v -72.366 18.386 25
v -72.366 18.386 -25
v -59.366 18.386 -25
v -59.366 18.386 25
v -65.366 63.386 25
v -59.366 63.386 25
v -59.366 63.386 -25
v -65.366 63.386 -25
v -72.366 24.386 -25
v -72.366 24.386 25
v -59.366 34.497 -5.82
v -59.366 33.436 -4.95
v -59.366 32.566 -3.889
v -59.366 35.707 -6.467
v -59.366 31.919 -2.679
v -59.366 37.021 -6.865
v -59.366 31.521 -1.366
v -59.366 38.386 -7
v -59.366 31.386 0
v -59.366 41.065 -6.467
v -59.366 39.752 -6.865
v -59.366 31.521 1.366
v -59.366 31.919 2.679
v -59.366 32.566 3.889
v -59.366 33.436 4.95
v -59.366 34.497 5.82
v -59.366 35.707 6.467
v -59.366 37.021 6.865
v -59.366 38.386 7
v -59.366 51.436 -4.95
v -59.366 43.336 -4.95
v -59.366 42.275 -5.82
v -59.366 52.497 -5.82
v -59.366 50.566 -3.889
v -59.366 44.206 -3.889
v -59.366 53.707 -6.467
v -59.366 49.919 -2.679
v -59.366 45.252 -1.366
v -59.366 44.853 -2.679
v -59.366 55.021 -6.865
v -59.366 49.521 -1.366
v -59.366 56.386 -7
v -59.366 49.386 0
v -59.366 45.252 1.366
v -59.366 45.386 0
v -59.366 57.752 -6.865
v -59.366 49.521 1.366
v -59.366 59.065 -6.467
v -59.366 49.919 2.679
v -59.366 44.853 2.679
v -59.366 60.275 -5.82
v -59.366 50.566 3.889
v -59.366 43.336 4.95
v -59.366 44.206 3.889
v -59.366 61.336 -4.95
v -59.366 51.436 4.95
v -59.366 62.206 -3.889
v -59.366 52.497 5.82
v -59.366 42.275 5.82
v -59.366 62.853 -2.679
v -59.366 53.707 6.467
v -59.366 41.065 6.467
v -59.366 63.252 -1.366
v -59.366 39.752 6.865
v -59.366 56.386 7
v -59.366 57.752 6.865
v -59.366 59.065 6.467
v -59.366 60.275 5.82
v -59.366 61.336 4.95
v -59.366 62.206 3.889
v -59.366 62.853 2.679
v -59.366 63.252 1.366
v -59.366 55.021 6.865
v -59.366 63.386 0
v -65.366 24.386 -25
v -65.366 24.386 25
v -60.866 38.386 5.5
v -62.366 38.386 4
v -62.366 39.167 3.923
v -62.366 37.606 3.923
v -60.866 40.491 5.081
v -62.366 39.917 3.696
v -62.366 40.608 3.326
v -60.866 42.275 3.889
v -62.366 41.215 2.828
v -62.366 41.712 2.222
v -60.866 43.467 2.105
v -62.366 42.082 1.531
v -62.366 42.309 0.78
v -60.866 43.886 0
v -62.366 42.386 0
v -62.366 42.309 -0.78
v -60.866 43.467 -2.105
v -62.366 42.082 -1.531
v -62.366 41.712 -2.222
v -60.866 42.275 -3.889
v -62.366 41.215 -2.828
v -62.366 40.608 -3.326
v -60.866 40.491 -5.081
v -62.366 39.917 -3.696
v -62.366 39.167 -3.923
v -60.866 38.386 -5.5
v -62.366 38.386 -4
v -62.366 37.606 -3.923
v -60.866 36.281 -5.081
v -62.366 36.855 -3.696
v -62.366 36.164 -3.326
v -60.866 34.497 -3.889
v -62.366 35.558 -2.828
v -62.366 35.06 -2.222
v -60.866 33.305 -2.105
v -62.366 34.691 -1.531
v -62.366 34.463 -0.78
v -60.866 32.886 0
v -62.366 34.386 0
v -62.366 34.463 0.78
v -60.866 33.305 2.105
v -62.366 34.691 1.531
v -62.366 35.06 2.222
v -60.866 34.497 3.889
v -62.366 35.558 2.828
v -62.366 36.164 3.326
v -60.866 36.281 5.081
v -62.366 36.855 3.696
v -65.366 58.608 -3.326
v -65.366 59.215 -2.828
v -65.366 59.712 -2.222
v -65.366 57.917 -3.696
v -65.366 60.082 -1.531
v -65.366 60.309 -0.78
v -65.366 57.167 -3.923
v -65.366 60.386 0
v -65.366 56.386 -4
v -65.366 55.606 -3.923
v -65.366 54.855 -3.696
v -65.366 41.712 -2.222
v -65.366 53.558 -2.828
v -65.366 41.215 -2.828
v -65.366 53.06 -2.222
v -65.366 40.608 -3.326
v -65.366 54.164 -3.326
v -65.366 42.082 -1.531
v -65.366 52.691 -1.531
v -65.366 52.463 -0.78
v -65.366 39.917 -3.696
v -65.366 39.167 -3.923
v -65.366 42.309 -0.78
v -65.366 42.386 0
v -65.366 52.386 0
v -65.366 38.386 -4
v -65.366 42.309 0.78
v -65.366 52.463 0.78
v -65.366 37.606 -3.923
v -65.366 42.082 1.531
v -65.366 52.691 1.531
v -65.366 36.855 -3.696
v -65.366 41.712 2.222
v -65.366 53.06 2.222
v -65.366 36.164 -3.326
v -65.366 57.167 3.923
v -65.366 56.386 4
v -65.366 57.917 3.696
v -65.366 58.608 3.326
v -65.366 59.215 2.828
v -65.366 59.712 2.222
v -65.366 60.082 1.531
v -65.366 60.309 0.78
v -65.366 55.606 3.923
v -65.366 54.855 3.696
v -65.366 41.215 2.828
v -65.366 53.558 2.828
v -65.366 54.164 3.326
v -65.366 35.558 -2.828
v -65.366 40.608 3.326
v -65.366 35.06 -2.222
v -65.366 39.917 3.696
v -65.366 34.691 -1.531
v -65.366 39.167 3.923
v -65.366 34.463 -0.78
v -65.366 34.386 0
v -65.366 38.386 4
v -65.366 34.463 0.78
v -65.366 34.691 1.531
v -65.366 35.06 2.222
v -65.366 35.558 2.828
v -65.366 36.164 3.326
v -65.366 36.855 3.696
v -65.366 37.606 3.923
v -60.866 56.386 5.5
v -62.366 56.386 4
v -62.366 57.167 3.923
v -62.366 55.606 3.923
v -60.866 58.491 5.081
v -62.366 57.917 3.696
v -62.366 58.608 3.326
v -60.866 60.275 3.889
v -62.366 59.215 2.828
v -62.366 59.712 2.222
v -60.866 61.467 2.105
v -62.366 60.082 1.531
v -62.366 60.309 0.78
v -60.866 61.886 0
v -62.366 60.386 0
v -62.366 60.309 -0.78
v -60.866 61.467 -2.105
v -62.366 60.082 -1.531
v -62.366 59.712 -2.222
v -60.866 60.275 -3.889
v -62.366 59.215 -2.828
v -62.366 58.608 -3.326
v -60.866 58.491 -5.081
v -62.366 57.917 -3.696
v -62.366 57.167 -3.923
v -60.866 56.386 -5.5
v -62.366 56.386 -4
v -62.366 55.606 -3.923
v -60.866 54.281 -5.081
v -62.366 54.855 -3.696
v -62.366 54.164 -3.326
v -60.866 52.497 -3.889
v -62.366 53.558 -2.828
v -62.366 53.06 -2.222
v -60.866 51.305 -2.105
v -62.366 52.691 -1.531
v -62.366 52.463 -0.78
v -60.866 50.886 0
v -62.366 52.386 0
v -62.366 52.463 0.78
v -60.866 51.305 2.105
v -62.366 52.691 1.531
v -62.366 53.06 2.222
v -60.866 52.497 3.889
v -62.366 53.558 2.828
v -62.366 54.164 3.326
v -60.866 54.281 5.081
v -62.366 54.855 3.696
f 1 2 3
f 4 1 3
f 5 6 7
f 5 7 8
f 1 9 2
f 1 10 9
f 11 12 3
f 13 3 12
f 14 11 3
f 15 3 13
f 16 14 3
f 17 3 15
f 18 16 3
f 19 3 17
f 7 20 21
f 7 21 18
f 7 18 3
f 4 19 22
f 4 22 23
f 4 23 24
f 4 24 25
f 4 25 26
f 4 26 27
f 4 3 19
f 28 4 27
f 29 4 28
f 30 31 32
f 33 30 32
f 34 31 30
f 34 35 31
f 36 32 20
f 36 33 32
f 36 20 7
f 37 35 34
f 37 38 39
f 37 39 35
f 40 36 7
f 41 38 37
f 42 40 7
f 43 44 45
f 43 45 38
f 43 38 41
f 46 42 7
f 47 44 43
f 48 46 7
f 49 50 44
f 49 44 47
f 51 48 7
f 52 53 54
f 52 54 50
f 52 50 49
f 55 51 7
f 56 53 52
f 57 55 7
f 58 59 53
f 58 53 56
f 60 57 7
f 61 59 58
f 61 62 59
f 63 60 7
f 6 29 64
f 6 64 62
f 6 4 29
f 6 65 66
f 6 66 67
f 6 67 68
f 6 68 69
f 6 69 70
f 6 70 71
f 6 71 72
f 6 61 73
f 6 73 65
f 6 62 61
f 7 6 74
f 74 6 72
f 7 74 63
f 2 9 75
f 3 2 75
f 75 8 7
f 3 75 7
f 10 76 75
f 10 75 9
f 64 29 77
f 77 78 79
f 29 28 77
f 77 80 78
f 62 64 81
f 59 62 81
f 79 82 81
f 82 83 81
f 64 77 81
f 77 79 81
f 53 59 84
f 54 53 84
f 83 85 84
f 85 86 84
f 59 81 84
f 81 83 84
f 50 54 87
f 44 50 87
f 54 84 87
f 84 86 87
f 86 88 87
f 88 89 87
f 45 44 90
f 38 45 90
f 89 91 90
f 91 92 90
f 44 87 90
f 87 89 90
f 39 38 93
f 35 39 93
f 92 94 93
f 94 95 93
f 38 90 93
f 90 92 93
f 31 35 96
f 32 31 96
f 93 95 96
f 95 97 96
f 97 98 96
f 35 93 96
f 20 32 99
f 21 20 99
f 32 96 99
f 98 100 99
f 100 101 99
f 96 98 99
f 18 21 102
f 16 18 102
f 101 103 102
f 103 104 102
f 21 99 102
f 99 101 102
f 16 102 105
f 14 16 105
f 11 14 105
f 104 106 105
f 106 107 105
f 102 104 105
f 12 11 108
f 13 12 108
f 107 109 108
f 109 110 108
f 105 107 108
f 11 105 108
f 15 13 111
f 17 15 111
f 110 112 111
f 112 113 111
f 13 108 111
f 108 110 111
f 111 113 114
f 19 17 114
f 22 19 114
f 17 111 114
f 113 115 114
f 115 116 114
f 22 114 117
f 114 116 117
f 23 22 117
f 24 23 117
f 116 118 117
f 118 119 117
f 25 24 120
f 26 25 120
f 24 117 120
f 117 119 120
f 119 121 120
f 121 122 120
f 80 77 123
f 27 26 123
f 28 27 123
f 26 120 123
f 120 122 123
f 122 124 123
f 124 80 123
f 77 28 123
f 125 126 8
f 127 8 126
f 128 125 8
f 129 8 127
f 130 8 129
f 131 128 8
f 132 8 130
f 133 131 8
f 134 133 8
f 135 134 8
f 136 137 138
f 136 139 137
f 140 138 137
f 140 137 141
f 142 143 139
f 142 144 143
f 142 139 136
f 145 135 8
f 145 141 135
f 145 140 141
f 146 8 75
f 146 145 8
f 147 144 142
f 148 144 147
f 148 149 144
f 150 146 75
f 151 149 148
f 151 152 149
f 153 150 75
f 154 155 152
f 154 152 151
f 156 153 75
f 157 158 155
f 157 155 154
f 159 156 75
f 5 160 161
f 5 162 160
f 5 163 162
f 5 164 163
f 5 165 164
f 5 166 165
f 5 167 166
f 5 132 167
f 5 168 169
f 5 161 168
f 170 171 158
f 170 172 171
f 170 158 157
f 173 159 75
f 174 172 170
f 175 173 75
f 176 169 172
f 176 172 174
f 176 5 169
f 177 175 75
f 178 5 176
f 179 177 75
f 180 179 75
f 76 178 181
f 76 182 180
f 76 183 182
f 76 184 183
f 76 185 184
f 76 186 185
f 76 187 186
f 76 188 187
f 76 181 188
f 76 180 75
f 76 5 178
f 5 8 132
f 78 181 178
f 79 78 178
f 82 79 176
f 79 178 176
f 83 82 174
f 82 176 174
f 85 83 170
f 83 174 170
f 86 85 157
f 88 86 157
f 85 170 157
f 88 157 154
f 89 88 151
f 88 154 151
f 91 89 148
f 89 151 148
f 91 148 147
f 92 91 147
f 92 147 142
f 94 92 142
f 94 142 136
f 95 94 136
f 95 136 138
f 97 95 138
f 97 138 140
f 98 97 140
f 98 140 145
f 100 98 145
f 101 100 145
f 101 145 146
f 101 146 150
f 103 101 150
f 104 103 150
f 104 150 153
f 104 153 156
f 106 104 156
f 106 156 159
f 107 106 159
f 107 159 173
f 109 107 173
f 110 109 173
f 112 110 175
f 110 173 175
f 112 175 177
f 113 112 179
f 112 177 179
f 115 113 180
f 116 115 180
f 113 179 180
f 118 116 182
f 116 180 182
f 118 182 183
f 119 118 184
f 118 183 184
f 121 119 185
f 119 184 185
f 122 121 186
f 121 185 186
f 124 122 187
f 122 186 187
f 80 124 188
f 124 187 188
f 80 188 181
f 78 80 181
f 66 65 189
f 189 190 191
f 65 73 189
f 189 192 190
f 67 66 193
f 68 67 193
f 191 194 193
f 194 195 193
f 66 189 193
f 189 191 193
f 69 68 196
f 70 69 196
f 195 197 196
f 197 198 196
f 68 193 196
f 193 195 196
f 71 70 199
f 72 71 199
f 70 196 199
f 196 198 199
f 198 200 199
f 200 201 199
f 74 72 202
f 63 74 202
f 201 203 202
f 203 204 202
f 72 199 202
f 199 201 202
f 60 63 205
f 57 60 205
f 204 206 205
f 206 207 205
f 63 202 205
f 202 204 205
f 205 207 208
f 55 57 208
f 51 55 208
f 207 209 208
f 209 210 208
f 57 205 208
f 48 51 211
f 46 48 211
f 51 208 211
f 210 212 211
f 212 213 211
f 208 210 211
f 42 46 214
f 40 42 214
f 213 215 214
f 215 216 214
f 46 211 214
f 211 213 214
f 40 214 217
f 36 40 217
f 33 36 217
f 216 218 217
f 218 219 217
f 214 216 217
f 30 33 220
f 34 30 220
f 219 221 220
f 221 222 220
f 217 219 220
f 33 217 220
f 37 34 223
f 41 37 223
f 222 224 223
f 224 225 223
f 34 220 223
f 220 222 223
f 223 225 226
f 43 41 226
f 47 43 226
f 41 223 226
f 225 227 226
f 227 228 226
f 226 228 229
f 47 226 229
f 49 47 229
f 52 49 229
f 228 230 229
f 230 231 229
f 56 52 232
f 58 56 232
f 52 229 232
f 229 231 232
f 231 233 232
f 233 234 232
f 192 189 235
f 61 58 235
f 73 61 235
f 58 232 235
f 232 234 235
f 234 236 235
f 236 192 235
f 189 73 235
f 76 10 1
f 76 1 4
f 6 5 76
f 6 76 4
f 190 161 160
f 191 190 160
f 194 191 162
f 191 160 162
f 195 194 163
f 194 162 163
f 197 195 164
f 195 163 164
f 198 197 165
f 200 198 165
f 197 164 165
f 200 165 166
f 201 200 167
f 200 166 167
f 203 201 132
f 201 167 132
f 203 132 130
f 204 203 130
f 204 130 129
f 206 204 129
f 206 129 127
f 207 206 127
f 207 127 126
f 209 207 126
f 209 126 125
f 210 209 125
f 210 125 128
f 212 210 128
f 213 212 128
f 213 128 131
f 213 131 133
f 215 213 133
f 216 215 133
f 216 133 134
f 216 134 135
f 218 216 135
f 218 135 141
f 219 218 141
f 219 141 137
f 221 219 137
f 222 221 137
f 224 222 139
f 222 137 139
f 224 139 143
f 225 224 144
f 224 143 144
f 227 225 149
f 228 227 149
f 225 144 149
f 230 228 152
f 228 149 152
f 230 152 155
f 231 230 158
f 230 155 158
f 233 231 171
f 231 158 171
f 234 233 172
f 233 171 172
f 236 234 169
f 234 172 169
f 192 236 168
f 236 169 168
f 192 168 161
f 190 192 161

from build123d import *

# Parameters (mm, degrees)
BOSS_EXTRUDE1_DEPTH   = 25
F_1_0MM_DOWEL_HOLE1_D = 8
CHAMFER1_SIZE         = 3


with BuildPart() as part:
    # Sketch1 → Boss-Extrude1 (new, symmetric)
    with BuildSketch(Plane.XY):
        Polygon((-59.365603585, 18.386149477), (-59.365603585, 63.386149477), (-65.365603585, 63.386149477), (-65.365603585, 24.386149477), (-72.365603585, 24.386149477), (-72.365603585, 18.386149477), align=None)
    extrude(amount=BOSS_EXTRUDE1_DEPTH, both=True)

    # Ø1.0mm Dowel Hole1 (through all)
    with Locations(Plane(origin=(-59.365603585, 0, 0), x_dir=(0, 0, -1), z_dir=(1, 0, 0))):
        with Locations((0, 56.386149477), (0, 38.386149477)):
            Hole(F_1_0MM_DOWEL_HOLE1_D / 2)

    # Chamfer1
    chamfer1_edges = [part.edges().sort_by_distance(p)[0] for p in [
        (-59.365603585, 38.386149477, -4),
        (-59.365603585, 56.386149477, -4),
    ]]
    chamfer(chamfer1_edges, length=CHAMFER1_SIZE - 0.0001)  # a hair under: the kernel refuses the full size


solid = part.part
